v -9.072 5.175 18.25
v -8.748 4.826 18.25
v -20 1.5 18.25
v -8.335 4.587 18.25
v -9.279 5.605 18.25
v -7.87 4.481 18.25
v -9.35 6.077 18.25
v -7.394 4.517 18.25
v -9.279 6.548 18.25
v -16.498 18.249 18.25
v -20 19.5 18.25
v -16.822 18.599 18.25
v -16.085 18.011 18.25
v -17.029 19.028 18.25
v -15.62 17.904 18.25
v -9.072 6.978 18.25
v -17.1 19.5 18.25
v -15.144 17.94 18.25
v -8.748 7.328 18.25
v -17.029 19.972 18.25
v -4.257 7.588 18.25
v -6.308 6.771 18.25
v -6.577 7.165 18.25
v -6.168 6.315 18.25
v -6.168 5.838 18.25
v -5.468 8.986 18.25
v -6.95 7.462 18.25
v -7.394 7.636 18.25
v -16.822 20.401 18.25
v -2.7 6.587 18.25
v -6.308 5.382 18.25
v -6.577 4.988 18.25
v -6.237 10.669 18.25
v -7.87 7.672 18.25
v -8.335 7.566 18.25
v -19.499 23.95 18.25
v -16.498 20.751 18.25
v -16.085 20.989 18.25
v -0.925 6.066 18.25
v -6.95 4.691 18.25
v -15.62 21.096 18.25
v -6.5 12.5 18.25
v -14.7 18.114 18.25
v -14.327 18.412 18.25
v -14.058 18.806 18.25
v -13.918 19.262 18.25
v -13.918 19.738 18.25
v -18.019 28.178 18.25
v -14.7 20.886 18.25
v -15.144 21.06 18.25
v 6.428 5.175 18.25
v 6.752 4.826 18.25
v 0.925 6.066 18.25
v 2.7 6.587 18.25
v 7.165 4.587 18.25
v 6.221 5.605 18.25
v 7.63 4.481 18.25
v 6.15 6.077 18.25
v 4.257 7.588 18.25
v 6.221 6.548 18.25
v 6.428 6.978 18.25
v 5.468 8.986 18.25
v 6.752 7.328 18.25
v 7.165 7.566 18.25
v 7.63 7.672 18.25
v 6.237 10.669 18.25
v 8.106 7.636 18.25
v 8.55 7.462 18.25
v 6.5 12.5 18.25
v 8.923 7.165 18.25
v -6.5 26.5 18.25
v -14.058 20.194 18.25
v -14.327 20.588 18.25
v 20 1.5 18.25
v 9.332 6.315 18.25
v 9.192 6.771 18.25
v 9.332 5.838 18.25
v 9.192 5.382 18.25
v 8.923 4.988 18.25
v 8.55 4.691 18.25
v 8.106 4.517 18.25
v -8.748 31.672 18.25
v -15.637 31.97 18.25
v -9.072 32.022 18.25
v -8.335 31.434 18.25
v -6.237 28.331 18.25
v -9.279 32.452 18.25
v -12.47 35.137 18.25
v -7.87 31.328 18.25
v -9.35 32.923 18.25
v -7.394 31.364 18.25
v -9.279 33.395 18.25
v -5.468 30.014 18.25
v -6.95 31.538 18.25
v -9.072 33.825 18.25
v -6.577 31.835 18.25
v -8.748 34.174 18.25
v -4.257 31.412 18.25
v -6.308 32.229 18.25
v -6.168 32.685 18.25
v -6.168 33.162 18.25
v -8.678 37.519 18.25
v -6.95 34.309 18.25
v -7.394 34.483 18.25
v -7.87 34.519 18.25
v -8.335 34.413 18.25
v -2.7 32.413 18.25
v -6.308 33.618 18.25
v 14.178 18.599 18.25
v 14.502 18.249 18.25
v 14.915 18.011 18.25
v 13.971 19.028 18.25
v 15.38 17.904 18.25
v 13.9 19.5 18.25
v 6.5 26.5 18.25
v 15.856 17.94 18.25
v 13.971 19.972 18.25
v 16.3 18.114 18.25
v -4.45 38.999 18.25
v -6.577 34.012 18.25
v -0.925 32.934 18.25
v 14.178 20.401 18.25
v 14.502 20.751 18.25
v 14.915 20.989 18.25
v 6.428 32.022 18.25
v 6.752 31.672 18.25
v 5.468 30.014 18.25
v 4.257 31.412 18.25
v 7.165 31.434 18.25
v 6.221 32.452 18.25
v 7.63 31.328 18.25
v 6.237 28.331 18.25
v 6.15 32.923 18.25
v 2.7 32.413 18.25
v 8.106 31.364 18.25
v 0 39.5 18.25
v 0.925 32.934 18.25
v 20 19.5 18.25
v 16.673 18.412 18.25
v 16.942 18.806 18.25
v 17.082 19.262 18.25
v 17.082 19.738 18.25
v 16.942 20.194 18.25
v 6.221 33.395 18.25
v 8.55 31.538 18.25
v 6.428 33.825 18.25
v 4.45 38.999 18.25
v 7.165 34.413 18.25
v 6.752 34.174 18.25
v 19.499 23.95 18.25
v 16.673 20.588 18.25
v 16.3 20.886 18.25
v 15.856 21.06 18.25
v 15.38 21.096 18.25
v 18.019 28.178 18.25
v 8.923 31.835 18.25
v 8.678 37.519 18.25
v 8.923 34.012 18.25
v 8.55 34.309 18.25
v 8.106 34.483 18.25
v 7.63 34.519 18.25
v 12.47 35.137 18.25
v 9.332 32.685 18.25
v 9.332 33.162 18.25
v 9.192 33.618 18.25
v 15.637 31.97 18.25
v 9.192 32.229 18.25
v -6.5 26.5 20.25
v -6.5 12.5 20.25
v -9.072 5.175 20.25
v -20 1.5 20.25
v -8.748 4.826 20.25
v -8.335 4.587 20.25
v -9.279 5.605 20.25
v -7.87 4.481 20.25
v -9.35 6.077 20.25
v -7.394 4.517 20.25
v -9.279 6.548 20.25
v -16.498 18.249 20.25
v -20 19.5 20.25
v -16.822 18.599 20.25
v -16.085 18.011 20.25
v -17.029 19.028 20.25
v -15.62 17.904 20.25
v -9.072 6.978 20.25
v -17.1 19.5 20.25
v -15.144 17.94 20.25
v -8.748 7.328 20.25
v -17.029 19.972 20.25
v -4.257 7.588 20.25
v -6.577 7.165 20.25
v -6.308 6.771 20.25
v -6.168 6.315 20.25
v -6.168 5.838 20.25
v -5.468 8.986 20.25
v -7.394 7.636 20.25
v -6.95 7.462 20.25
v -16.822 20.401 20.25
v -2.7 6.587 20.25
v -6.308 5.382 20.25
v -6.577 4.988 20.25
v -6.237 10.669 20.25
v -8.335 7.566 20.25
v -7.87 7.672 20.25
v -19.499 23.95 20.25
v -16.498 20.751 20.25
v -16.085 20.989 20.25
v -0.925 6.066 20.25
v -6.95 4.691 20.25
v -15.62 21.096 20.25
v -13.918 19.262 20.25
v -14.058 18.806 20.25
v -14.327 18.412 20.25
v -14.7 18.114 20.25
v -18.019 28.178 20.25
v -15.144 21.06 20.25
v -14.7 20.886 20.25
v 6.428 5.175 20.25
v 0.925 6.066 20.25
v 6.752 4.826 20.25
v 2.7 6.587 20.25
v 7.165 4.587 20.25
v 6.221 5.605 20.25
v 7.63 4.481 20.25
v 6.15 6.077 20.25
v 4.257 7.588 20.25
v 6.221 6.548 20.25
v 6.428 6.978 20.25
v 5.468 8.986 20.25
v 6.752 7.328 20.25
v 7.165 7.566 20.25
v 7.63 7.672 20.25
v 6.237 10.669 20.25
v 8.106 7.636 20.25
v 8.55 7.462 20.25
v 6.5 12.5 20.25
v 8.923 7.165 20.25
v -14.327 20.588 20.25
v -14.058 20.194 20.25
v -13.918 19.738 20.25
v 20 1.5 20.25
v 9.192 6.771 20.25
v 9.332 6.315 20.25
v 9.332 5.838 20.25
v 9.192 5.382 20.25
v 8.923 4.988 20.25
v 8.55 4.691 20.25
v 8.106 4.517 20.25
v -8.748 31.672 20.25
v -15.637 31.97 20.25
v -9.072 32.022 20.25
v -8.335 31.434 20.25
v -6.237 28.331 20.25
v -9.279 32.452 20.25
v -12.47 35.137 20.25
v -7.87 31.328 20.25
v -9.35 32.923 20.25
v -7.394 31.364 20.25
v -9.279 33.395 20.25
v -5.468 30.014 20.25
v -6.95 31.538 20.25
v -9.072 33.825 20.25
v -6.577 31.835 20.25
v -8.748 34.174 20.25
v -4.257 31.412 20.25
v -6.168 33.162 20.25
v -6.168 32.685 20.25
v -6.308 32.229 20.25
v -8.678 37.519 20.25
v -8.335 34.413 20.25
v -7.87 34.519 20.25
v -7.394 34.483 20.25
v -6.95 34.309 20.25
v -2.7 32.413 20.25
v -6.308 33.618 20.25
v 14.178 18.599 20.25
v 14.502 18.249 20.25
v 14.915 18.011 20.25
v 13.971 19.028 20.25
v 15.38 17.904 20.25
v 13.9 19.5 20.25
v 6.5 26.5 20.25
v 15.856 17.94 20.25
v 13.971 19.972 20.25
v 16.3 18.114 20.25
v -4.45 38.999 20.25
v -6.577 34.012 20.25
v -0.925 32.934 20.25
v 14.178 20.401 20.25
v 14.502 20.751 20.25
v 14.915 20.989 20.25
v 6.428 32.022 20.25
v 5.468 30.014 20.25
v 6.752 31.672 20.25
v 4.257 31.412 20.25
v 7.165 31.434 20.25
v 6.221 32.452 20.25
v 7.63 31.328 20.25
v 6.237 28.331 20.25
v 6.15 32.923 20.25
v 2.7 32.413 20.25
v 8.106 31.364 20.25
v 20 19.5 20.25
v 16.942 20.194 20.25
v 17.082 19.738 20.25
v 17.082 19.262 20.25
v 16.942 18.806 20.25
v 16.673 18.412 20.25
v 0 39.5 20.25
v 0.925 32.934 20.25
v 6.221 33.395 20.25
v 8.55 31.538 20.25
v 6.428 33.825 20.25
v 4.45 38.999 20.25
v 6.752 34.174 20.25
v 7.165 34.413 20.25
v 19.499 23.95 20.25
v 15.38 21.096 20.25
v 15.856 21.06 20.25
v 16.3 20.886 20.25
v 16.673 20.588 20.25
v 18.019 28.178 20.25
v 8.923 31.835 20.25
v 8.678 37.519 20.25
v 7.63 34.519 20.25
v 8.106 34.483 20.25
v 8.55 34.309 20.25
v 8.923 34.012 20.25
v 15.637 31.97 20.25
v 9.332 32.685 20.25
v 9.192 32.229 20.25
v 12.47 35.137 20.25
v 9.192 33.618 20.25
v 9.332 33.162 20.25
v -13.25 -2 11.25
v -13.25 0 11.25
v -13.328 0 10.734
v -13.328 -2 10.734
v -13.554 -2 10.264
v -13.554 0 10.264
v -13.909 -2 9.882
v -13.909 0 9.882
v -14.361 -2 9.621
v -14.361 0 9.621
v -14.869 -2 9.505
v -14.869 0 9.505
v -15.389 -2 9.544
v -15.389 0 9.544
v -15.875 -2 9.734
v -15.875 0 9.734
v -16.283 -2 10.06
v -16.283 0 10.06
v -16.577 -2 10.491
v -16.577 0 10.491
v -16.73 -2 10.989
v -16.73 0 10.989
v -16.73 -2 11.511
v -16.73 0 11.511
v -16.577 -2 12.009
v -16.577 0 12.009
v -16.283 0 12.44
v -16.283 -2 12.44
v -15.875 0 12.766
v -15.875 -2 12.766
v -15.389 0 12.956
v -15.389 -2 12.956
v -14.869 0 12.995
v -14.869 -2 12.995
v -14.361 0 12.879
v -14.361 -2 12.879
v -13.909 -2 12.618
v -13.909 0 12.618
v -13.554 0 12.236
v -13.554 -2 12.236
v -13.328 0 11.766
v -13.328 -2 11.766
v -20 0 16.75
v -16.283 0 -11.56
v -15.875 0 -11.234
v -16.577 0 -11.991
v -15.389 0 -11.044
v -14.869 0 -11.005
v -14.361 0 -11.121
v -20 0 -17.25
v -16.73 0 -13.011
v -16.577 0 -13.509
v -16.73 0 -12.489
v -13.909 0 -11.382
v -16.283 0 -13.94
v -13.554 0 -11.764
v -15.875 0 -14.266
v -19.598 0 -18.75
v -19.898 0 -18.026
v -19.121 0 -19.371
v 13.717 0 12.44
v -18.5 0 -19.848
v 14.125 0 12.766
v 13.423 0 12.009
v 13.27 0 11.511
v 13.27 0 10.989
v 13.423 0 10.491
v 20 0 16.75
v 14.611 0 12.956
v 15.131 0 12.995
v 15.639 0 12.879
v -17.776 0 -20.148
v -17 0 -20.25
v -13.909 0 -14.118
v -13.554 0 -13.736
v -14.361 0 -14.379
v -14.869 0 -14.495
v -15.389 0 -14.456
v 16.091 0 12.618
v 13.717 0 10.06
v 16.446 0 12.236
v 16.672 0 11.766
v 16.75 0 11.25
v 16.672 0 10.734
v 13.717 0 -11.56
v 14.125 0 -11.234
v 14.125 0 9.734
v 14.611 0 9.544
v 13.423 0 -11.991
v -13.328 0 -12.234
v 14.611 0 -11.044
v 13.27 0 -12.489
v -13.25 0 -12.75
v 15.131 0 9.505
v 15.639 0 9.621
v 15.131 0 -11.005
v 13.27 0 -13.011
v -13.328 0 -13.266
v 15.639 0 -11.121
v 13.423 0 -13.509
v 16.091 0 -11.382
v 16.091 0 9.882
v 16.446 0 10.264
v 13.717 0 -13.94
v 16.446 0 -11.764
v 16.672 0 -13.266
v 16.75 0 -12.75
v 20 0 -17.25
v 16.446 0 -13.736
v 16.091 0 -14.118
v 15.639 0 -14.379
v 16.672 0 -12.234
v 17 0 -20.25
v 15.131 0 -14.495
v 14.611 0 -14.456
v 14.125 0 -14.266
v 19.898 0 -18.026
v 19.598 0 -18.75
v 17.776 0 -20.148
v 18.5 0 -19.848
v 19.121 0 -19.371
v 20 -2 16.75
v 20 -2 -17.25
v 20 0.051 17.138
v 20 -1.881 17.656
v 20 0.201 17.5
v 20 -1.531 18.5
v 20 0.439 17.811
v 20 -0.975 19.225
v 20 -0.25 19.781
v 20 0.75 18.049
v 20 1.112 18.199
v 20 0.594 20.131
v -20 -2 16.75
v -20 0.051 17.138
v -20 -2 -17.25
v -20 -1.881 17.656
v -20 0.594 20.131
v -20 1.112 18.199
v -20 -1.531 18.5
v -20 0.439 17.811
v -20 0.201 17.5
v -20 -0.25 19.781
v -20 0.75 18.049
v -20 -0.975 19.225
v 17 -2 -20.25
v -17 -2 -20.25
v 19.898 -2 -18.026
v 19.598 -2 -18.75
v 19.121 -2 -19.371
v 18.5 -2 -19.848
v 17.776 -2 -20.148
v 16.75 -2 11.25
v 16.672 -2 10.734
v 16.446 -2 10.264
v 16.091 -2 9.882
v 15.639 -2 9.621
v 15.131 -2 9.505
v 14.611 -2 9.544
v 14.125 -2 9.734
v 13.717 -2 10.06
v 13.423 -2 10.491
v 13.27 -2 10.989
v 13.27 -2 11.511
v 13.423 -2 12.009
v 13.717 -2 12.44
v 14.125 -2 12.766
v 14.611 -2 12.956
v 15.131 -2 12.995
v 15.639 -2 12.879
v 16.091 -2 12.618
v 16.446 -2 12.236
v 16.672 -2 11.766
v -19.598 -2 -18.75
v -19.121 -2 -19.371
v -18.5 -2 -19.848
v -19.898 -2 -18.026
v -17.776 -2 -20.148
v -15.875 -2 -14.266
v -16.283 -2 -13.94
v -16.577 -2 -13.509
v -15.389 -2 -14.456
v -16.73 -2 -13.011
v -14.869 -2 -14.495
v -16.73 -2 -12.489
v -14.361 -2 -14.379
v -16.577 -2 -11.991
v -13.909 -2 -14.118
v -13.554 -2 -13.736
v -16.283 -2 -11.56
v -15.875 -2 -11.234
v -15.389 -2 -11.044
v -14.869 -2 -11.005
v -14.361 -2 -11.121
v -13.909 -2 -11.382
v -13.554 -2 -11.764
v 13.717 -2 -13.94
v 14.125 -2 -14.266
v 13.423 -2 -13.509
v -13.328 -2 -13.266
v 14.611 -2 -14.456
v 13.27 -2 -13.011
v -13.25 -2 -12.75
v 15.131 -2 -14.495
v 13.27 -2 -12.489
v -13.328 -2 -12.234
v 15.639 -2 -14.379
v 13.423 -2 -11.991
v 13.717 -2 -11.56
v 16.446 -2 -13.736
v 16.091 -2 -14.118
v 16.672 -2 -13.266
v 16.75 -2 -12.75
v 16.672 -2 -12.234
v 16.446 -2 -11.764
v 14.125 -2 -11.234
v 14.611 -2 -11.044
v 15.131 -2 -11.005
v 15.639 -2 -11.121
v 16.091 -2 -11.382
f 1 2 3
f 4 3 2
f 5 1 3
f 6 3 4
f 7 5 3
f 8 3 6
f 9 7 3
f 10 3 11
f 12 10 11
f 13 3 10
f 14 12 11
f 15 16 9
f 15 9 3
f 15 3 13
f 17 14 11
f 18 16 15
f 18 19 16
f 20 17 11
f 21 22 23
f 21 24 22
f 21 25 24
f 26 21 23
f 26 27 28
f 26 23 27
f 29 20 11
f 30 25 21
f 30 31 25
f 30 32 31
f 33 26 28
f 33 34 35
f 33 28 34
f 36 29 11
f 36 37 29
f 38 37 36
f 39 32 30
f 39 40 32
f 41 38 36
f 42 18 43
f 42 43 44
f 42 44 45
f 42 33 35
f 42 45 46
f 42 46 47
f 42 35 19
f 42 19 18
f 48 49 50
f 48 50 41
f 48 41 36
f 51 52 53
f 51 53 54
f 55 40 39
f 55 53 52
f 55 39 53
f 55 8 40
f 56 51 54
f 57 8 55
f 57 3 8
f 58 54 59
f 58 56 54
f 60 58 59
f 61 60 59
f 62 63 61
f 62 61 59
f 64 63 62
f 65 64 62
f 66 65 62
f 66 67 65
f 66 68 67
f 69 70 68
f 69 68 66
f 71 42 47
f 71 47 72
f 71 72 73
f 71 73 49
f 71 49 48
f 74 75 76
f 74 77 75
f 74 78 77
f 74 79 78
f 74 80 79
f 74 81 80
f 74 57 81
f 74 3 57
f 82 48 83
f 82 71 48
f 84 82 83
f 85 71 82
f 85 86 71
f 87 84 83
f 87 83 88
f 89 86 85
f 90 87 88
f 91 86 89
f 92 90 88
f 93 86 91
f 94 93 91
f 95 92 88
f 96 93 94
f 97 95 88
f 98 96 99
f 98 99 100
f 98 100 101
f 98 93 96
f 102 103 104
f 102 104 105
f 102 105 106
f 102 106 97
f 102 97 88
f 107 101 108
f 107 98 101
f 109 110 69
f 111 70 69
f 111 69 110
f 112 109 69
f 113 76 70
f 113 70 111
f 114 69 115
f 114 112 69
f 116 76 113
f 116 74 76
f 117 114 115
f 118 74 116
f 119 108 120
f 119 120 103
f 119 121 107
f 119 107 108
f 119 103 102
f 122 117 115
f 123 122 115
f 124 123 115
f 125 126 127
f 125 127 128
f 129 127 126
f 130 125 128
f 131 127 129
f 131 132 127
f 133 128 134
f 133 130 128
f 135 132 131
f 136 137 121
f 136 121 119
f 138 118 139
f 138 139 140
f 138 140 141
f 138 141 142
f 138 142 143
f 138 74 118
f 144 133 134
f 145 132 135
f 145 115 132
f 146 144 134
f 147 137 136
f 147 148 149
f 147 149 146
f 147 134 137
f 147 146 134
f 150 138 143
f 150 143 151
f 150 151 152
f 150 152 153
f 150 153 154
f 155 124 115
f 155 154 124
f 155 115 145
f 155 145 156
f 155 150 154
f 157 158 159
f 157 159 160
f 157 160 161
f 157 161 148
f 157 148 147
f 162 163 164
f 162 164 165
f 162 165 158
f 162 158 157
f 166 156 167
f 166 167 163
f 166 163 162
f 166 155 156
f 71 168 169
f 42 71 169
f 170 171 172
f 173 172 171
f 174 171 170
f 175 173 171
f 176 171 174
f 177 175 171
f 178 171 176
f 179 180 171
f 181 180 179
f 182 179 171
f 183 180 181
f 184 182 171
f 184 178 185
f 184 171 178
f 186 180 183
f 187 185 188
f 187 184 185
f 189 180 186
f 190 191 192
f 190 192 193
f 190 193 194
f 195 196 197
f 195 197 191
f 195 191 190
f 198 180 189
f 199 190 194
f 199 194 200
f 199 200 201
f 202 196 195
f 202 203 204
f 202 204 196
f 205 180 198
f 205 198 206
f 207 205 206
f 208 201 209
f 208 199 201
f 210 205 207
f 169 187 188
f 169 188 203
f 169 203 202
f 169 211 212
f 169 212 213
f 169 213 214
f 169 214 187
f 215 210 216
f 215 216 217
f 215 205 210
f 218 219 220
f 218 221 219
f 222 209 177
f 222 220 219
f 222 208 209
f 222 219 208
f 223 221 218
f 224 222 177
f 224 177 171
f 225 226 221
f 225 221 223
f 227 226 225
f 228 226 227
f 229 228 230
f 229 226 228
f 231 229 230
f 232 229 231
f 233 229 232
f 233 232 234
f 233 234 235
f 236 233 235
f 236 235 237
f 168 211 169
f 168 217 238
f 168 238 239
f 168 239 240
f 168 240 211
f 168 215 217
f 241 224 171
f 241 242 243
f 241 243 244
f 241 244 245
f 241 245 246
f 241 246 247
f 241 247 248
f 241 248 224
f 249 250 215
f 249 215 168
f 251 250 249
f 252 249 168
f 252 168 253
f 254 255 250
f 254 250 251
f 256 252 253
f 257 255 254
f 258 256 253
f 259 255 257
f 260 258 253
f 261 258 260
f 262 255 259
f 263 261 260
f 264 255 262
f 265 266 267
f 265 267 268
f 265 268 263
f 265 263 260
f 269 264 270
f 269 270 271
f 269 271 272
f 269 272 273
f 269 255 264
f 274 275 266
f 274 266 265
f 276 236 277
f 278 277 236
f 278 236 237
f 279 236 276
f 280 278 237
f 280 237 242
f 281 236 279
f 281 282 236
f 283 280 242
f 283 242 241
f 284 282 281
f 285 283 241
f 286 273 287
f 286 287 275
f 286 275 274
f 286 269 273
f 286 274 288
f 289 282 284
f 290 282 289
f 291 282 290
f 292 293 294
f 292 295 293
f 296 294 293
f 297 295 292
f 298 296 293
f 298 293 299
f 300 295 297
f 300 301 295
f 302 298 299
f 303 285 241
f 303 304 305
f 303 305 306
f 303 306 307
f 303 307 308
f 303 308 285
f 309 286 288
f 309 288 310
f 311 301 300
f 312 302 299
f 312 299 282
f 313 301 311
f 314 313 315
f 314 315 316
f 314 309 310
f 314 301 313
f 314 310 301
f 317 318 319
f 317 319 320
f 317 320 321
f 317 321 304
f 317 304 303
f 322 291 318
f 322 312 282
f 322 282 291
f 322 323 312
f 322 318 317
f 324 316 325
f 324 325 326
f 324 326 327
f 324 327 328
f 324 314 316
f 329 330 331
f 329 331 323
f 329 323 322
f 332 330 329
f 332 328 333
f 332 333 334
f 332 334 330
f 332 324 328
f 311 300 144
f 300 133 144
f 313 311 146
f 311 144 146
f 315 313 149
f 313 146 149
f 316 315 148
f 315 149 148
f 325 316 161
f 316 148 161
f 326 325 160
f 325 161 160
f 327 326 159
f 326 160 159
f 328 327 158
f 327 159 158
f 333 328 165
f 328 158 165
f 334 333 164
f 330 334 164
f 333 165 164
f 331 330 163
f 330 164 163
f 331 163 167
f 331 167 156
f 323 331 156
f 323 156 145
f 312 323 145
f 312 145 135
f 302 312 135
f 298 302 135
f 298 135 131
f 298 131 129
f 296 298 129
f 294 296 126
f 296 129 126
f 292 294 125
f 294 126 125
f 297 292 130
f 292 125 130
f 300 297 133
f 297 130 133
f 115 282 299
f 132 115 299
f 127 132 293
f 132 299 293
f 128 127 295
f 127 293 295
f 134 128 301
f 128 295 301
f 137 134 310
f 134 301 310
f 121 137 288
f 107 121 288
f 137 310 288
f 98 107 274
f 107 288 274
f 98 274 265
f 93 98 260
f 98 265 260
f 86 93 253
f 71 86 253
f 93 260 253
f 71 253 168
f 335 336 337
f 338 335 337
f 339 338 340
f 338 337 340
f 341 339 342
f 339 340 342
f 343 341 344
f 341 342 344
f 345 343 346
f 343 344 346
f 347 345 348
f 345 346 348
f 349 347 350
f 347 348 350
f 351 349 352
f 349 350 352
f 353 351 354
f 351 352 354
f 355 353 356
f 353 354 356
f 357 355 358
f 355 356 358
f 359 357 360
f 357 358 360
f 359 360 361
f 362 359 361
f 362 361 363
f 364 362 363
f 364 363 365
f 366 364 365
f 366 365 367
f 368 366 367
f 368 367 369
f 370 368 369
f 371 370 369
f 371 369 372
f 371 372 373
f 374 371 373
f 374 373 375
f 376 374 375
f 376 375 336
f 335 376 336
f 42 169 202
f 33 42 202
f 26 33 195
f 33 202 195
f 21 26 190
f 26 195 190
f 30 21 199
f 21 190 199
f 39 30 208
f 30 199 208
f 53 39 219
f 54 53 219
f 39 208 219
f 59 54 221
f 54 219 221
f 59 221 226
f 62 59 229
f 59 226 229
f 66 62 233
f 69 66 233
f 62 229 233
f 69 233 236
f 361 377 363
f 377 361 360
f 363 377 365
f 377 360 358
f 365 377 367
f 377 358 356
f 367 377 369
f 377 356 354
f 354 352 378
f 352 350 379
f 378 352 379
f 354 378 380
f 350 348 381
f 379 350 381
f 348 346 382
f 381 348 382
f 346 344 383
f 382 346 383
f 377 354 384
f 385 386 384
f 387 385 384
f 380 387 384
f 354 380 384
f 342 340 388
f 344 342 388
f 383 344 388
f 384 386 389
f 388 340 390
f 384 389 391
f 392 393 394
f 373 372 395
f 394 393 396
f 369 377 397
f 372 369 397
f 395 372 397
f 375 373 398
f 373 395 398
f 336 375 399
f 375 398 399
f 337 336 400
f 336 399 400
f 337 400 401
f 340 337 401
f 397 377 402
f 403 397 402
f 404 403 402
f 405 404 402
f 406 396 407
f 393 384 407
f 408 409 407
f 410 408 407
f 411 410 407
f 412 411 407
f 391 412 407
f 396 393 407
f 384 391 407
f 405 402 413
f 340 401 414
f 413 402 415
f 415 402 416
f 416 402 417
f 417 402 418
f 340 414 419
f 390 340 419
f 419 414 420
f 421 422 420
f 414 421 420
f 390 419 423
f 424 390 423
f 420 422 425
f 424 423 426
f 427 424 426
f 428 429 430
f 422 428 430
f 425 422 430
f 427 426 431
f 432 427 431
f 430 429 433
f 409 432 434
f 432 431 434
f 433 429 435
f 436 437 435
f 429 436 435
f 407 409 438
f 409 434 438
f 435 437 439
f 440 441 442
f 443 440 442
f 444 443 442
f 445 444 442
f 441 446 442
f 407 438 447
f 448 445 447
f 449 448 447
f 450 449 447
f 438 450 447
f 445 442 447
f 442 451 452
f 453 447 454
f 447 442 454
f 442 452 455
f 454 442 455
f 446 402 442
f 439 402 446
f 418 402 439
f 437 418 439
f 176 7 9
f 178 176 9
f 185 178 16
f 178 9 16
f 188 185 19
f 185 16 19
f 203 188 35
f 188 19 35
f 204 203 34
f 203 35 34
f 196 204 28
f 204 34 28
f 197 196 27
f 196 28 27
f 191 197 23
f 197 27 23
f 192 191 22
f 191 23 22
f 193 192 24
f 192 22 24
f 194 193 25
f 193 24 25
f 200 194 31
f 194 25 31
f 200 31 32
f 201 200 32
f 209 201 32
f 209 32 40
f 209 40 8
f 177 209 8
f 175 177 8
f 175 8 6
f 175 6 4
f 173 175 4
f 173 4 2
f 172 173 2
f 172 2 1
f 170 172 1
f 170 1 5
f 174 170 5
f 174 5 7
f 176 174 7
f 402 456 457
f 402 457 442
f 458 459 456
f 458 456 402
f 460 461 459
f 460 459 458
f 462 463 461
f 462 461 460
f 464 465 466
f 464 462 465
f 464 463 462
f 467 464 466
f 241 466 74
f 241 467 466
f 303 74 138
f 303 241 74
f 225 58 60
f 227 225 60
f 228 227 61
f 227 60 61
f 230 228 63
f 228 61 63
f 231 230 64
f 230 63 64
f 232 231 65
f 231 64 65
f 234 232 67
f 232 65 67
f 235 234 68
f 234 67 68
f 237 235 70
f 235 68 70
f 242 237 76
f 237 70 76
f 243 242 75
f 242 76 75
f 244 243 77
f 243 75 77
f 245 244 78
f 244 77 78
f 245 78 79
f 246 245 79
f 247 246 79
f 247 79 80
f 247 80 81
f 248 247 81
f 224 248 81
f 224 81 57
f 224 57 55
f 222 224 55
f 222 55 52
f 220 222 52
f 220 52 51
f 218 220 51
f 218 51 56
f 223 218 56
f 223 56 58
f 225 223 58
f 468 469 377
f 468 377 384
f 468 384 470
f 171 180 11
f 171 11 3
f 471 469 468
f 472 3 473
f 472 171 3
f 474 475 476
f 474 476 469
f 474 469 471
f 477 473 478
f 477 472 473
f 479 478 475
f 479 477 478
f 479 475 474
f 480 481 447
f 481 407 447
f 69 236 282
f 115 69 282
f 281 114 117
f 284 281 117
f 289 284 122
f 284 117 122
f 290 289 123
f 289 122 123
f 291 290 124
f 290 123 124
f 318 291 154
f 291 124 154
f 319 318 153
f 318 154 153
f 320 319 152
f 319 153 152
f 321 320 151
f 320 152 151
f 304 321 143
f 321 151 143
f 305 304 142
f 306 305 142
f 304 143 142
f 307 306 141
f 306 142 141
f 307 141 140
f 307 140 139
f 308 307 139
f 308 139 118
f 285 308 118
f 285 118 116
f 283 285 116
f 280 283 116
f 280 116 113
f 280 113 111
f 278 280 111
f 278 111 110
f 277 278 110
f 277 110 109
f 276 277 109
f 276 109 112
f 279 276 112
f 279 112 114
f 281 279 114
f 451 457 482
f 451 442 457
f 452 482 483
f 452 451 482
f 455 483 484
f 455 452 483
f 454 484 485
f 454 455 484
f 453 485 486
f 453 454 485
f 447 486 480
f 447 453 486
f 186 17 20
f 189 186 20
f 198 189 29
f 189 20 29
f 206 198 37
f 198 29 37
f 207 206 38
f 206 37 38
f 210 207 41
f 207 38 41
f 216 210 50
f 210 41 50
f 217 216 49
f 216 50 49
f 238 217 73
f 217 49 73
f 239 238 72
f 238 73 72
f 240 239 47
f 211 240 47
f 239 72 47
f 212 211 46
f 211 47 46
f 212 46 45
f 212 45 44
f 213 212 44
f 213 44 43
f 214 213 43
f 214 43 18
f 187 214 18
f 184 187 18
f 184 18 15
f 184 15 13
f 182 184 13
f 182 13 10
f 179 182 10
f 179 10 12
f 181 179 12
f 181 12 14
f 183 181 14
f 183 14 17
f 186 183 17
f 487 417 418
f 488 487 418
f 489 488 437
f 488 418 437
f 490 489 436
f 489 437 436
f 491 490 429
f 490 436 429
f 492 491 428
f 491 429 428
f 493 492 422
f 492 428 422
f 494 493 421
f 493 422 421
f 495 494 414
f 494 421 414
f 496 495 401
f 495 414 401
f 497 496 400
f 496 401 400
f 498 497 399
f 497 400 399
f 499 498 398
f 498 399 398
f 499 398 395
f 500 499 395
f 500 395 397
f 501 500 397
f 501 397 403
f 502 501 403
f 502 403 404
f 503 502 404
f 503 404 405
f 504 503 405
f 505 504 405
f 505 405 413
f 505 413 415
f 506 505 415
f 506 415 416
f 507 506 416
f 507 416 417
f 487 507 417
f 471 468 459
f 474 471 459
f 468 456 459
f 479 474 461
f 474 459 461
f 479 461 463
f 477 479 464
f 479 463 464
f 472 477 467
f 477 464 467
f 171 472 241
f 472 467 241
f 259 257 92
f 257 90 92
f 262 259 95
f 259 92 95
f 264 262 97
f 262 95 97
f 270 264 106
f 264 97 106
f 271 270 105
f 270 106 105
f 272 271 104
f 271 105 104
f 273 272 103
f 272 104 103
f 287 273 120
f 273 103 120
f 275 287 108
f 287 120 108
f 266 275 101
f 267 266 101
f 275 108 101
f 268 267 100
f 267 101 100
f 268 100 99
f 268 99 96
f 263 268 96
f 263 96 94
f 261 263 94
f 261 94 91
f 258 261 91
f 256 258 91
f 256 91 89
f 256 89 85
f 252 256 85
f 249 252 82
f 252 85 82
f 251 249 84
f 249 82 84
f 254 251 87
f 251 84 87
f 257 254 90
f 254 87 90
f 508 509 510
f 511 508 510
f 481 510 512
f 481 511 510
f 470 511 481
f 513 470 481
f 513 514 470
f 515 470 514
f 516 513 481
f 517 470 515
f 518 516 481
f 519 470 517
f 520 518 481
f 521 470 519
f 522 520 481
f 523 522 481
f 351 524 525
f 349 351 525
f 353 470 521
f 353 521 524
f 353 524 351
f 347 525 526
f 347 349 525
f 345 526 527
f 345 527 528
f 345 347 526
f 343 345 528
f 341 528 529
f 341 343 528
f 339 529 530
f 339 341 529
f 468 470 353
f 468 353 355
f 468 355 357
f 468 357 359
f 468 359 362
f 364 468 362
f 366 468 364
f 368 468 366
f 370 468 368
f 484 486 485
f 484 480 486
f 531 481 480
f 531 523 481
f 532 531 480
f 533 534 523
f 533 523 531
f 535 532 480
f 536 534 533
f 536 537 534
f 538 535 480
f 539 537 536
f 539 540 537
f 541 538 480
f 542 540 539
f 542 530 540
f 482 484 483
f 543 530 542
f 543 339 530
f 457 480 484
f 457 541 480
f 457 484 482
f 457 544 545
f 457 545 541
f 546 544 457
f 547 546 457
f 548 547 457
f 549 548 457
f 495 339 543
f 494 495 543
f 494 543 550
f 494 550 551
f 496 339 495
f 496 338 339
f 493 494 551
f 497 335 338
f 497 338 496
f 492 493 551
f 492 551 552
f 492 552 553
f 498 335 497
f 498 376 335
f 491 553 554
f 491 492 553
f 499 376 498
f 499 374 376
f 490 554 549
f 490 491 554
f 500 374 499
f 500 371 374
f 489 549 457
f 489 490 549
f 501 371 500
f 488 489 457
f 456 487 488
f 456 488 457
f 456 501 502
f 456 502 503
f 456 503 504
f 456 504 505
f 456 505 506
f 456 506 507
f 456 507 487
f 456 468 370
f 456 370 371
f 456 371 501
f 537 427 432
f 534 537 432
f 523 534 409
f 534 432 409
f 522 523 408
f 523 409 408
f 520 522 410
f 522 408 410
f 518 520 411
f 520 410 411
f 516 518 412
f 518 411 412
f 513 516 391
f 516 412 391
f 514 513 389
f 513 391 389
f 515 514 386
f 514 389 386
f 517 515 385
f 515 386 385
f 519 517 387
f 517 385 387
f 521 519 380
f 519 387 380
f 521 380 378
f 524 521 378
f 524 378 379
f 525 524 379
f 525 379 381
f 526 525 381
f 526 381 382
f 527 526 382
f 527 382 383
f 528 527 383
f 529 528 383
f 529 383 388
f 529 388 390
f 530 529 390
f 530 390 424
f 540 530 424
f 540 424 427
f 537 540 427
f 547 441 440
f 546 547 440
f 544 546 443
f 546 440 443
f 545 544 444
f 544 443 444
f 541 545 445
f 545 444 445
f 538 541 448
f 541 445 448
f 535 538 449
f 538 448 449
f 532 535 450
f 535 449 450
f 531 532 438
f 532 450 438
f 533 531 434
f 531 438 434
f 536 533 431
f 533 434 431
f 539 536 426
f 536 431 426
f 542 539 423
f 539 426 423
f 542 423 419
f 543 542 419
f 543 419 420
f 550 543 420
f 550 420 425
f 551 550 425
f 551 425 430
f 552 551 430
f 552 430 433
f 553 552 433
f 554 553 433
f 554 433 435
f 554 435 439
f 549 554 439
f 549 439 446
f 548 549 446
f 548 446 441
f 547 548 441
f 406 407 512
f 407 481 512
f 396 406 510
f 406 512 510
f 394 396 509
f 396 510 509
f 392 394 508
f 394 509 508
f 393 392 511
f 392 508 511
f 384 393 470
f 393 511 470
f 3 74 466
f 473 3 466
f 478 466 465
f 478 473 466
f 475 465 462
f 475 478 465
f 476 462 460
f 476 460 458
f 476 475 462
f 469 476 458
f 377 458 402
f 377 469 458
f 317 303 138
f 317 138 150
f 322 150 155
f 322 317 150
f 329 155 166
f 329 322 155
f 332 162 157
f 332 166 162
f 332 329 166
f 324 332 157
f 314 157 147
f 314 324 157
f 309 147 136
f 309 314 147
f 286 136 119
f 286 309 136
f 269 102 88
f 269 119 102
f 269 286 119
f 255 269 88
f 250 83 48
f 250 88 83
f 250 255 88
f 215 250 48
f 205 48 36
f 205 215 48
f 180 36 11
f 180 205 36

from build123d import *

# Parameters (mm, degrees)
EXTRUDE_1_DEPTH             = 40.5
SKETCH_2_W                  = 38.5
SKETCH_2_H                  = 19.5
CUT_EXTRUDE_1_DEPTH         = 60.752092014
CUT_EXTRUDE_2_DEPTH         = 2
HOLE_WIZARD_3_5_3_5_1_D     = 3.5
HOLE_WIZARD_3_5_3_5_1_DEPTH = 2
HOLE_WIZARD_3_2_3_2_1_D     = 3.2
HOLE_WIZARD_3_2_3_2_1_DEPTH = 40.5
FILLET_1_R                  = 1.5
FILLET_2_R                  = 3
FILLET_3_R                  = 3.5
SKETCH_12_R                 = 1.6
CUT_EXTRUDE_3_DEPTH         = 38.5


with BuildPart() as part:
    # 草图1 → 凸台-拉伸1 (new body)
    with BuildSketch(Plane.XY.offset(20.25)):
        with BuildLine():
            Line((20, -2), (20, 19.5))
            ThreePointArc((20, 19.5), (0, 39.5), (-20, 19.5))
            Line((-20, 19.5), (-20, -2))
            Line((-20, -2), (20, -2))
        make_face()
    extrude(amount=-EXTRUDE_1_DEPTH)

    # 草图2 → 切除-拉伸1 (cut, through all)
    with BuildSketch(Plane(origin=(20, 0, 0), x_dir=(0, 0, -1), z_dir=(1, 0, 0))):
        with Locations((1, 9.75)):
            Rectangle(SKETCH_2_W, SKETCH_2_H)
    extrude(amount=-CUT_EXTRUDE_1_DEPTH, mode=Mode.SUBTRACT)

    # 草图3 → 切除-拉伸2 (cut)
    with BuildSketch(Plane.XY.offset(20.25)):
        with BuildLine():
            Line((-6.5, 26.5), (-6.5, 12.5))
            ThreePointArc((-6.5, 12.5), (0, 6), (6.5, 12.5))
            Line((6.5, 12.5), (6.5, 26.5))
            ThreePointArc((6.5, 26.5), (0, 33), (-6.5, 26.5))
        make_face()
    extrude(amount=-CUT_EXTRUDE_2_DEPTH, mode=Mode.SUBTRACT)

    # Ø3.5 (3.5) 直径孔1
    with Locations(Plane(origin=(0, -2, 0), x_dir=(-1, 0, 0), z_dir=(0, -1, 0))):
        with Locations((15, -11.25), (15, 12.75), (-15, 12.75), (-15, -11.25)):
            Hole(HOLE_WIZARD_3_5_3_5_1_D / 2, depth=HOLE_WIZARD_3_5_3_5_1_DEPTH)

    # Ø3.2 (3.2) 直径孔1
    with Locations(Plane.XY.offset(20.25)):
        with Locations((-7.75, 32.923393759), (-7.75, 6.076606241), (15.5, 19.5), (7.75, 6.076606241), (-15.5, 19.5), (7.75, 32.923393759)):
            Hole(HOLE_WIZARD_3_2_3_2_1_D / 2, depth=HOLE_WIZARD_3_2_3_2_1_DEPTH)

    # 圆角1
    fillet_1_edges = [part.edges().sort_by_distance(p)[0] for p in [
        (0, 0, 18.25),
    ]]
    fillet(fillet_1_edges, radius=FILLET_1_R)

    # 圆角2
    fillet_2_edges = [part.edges().sort_by_distance(p)[0] for p in [
        (-20, -1, -20.25),
        (20, -1, -20.25),
    ]]
    fillet(fillet_2_edges, radius=FILLET_2_R)

    # 圆角3
    fillet_3_edges = [part.edges().sort_by_distance(p)[0] for p in [
        (0, -2, 20.25),
    ]]
    fillet(fillet_3_edges, radius=FILLET_3_R)

    # 草图12 → 切除-拉伸3 (cut)
    with BuildSketch(Plane(origin=(0, 0, -20.25), x_dir=(-1, 0, 0), z_dir=(0, 0, -1))):
        with BuildLine():
            Line((-20, 19.5), (-17.1, 19.5))
            ThreePointArc((-17.1, 19.5), (-15.5, 21.1), (-13.9, 19.5))
            Line((-13.9, 19.5), (13.9, 19.5))
            ThreePointArc((13.9, 19.5), (15.5, 21.1), (17.1, 19.5))
            Line((17.1, 19.5), (20, 19.5))
            ThreePointArc((20, 19.5), (0, 39.5), (-20, 19.5))
        make_face()
        with Locations(Location((-7.75, 32.923393759, 0), (0, 0, 180))):
            Circle(SKETCH_12_R, mode=Mode.SUBTRACT)
        with Locations(Location((7.75, 32.923393759, 0), (0, 0, 180))):
            Circle(SKETCH_12_R, mode=Mode.SUBTRACT)
    extrude(amount=-CUT_EXTRUDE_3_DEPTH, mode=Mode.SUBTRACT)


solid = part.part
